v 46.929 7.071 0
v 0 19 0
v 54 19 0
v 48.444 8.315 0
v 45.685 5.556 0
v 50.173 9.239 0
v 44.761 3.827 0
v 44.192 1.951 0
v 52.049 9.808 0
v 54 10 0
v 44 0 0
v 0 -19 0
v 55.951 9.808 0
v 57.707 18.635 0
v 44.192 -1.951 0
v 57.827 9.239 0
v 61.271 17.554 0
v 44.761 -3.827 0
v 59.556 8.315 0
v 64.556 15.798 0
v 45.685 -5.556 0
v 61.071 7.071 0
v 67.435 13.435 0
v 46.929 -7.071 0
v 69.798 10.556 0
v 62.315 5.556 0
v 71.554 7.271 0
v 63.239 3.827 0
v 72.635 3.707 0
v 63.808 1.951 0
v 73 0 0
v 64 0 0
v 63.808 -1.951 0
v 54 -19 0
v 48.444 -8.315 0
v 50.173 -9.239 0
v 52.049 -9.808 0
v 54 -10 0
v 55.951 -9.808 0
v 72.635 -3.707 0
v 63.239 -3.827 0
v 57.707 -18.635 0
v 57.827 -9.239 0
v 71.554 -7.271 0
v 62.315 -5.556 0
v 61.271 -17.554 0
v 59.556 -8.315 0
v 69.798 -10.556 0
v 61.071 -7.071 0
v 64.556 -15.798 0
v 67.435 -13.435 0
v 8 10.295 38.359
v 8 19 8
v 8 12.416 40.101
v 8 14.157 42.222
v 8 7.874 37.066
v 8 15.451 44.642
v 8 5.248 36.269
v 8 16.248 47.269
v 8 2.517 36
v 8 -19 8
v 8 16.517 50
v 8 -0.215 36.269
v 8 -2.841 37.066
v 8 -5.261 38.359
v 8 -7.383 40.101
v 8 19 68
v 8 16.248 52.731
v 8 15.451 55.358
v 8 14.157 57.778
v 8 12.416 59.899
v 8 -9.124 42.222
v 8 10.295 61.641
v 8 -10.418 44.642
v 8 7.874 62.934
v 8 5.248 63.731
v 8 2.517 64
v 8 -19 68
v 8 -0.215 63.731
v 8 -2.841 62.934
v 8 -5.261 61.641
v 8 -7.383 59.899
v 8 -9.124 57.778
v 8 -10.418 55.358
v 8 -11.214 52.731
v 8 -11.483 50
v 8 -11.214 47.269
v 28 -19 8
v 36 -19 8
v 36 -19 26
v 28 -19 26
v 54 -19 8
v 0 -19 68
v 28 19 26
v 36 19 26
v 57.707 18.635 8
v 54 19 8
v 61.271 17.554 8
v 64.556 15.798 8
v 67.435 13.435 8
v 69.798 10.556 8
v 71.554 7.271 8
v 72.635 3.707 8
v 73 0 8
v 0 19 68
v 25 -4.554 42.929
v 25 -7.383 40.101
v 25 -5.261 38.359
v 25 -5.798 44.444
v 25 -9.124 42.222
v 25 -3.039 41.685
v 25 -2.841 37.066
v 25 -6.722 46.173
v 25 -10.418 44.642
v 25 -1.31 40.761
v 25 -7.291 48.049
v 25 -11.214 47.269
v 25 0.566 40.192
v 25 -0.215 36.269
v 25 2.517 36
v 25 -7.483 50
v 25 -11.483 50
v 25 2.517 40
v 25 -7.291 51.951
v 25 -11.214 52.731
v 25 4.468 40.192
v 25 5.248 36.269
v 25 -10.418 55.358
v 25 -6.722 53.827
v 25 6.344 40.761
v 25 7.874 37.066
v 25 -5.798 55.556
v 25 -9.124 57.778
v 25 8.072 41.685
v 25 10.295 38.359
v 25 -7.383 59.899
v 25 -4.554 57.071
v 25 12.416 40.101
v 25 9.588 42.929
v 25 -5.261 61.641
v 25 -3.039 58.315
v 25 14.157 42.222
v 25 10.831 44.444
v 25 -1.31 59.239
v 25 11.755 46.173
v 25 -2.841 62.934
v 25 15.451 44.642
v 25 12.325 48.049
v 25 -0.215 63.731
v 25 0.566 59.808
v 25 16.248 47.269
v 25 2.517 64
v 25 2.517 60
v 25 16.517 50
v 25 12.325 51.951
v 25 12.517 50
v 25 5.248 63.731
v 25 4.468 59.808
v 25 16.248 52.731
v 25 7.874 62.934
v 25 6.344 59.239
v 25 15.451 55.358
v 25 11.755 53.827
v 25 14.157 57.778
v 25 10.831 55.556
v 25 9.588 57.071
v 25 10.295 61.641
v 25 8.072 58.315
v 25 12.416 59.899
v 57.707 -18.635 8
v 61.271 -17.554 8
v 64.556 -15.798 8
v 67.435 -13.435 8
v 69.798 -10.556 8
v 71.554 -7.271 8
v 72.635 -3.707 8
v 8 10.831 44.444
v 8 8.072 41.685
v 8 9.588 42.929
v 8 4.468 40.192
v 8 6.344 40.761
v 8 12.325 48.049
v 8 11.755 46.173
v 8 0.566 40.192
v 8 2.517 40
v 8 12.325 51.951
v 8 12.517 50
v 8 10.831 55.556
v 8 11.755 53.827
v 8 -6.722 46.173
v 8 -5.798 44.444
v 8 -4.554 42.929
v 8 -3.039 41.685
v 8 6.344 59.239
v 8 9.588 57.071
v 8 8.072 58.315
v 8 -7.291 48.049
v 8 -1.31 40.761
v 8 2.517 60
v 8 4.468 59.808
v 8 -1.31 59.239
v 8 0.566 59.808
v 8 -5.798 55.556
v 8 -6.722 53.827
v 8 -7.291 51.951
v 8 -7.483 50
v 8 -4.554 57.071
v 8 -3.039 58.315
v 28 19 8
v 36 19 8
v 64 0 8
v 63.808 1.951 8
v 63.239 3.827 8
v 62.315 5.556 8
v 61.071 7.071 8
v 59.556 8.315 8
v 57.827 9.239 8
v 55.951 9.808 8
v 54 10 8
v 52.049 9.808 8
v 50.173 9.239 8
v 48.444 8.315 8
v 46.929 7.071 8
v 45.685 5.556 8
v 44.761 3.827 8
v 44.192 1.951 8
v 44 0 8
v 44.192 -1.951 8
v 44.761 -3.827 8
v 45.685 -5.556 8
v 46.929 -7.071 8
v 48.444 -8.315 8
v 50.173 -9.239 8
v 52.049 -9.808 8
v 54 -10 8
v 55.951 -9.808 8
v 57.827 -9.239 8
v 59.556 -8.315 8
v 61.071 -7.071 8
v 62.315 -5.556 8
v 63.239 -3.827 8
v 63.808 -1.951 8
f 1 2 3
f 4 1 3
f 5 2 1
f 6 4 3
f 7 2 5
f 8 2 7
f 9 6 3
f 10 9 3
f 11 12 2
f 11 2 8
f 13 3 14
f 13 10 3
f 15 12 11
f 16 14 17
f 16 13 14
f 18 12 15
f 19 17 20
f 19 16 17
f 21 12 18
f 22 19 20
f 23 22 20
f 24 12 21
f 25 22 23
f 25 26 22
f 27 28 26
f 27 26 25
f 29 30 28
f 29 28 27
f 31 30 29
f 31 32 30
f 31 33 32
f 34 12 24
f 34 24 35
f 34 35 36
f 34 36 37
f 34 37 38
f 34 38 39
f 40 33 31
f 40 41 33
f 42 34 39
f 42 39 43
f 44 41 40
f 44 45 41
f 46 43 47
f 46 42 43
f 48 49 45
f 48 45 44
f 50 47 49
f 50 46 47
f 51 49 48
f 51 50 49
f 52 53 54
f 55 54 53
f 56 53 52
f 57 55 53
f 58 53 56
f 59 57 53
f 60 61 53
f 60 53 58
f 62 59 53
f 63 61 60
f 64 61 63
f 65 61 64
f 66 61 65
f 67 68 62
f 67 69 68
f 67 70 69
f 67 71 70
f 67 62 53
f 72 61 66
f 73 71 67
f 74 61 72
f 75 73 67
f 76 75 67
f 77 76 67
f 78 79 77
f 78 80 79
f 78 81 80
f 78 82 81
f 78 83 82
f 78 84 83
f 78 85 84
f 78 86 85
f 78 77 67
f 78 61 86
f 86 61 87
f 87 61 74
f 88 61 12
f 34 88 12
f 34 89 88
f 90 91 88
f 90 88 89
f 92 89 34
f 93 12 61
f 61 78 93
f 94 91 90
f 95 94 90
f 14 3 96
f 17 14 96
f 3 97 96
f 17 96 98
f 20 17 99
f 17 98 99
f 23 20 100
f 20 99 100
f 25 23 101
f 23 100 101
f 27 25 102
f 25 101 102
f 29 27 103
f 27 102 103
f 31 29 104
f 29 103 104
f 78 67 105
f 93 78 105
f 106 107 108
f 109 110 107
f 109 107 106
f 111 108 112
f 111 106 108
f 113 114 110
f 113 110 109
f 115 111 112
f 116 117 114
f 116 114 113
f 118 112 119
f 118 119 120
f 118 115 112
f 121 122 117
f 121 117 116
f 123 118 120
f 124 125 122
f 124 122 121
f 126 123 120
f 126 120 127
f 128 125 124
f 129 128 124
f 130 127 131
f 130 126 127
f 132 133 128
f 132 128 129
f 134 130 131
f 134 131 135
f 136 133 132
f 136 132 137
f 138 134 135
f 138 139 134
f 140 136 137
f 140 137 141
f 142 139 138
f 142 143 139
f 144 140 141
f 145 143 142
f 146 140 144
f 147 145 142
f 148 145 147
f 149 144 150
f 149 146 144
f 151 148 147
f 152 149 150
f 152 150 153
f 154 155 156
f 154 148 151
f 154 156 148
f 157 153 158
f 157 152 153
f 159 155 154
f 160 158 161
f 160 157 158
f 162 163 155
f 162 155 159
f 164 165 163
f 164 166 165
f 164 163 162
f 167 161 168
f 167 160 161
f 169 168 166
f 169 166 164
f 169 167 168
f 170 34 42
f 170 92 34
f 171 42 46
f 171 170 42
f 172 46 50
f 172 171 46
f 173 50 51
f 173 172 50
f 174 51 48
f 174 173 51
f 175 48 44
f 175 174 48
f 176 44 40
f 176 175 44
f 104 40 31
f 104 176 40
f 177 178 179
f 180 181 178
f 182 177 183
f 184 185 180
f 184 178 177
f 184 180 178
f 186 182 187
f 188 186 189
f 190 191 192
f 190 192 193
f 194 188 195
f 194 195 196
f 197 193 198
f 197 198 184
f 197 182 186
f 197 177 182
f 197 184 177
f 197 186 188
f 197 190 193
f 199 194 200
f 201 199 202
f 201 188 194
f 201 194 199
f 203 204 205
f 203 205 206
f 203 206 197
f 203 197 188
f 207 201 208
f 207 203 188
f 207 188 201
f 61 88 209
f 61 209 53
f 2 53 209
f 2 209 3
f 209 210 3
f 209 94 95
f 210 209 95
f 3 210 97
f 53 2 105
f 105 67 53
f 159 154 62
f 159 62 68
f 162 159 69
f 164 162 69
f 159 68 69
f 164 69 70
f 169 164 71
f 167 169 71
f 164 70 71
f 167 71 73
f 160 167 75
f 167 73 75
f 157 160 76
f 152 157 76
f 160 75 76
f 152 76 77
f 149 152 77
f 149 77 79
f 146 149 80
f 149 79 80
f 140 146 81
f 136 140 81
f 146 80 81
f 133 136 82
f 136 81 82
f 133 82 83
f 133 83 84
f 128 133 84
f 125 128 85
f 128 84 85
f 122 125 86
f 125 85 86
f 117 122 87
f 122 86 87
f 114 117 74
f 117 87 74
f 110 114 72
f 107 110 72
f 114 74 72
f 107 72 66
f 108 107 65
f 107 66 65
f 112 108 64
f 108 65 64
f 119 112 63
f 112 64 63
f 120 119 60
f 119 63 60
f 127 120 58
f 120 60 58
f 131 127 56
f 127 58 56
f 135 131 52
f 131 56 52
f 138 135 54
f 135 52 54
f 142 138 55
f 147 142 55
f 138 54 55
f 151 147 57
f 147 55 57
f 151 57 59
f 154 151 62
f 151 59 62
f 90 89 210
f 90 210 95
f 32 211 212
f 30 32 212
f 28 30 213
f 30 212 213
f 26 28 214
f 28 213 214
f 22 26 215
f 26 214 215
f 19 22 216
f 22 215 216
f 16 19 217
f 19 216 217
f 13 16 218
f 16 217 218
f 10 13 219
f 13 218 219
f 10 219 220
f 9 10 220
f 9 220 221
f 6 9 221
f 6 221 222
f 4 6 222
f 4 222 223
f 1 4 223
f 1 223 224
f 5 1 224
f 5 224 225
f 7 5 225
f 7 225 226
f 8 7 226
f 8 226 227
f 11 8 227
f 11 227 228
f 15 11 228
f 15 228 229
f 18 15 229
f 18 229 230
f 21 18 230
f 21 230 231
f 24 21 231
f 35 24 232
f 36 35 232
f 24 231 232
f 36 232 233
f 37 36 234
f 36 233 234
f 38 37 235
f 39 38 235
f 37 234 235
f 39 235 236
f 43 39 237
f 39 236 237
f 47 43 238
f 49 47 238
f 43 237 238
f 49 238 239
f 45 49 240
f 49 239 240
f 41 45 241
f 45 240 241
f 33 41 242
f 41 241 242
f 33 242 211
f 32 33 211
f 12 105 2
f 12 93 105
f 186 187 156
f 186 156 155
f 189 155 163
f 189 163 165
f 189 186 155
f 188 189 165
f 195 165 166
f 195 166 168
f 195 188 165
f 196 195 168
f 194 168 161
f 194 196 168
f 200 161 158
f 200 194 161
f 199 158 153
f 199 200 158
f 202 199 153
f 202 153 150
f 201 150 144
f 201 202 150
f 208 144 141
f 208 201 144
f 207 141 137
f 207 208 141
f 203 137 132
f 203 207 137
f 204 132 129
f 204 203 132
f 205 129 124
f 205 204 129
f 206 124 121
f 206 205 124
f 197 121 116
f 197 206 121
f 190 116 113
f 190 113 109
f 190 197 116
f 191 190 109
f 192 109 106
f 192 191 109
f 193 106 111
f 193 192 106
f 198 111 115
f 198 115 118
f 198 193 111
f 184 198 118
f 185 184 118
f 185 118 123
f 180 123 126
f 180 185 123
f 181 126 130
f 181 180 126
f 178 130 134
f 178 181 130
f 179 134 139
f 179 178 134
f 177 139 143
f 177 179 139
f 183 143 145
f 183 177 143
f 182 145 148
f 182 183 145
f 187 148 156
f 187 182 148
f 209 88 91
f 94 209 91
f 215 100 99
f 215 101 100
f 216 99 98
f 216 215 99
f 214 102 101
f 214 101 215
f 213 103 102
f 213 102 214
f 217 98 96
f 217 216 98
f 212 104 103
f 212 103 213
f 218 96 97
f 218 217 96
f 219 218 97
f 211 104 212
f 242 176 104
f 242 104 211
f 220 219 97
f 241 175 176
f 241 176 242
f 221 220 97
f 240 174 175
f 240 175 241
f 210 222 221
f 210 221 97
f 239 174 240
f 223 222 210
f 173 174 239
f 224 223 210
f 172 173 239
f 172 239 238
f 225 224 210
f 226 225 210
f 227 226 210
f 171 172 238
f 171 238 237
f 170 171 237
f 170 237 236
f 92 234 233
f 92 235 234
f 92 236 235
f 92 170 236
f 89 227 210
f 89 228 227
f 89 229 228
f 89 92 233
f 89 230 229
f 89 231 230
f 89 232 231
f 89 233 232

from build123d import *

# Parameters (mm, degrees)
F1_DEPTH = 19
F2_R     = 14
F2_R_2   = 10
F3_DEPTH = 17
F4_R     = 18.99999
F5_R     = 10
F6_DEPTH = 8.001
F7_W     = 8
F7_H     = 18
F8_DEPTH = 38


# Not quite as in the source:
# - a fillet or chamfer is up to 0.001 mm smaller than in the source, because OpenCascade refuses the exact size


with BuildPart() as f1:
    # F0 (on Front) → F1 (new body, symmetric)
    with BuildSketch(Plane.XZ):
        Polygon((0, 68), (0, 0), (73, 0), (73, 8), (8, 8), (8, 68), align=None)
    extrude(amount=F1_DEPTH, both=True)

    # F2 (on face) → F3 (join)
    with BuildSketch(Plane.YZ.offset(8)):
        with Locations((2.5166787673, 50)):
            Circle(F2_R)
        with Locations((2.5166787673, 50)):
            Circle(F2_R_2, mode=Mode.SUBTRACT)
    extrude(amount=F3_DEPTH)

    # F4 (radius 19 in the source; OpenCascade refuses exactly that, so slightly less here)
    f4_edges = [f1.edges().sort_by_distance(p)[0] for p in [
        (73, -19, 4),
        (73, 19, 4),
    ]]
    fillet(f4_edges, radius=F4_R)

    # F5 (on face) → F6 (cut, through all)
    with BuildSketch(Plane.XY.offset(8)):
        with Locations((54, 0)):
            Circle(F5_R)
    extrude(amount=-F6_DEPTH, mode=Mode.SUBTRACT)

    # F7 (on face) → F8 (join, through all)
    with BuildSketch(Plane.XZ.offset(19)):
        with Locations((32, 17)):
            Rectangle(F7_W, F7_H)
    extrude(amount=-F8_DEPTH)


solid = f1.part
